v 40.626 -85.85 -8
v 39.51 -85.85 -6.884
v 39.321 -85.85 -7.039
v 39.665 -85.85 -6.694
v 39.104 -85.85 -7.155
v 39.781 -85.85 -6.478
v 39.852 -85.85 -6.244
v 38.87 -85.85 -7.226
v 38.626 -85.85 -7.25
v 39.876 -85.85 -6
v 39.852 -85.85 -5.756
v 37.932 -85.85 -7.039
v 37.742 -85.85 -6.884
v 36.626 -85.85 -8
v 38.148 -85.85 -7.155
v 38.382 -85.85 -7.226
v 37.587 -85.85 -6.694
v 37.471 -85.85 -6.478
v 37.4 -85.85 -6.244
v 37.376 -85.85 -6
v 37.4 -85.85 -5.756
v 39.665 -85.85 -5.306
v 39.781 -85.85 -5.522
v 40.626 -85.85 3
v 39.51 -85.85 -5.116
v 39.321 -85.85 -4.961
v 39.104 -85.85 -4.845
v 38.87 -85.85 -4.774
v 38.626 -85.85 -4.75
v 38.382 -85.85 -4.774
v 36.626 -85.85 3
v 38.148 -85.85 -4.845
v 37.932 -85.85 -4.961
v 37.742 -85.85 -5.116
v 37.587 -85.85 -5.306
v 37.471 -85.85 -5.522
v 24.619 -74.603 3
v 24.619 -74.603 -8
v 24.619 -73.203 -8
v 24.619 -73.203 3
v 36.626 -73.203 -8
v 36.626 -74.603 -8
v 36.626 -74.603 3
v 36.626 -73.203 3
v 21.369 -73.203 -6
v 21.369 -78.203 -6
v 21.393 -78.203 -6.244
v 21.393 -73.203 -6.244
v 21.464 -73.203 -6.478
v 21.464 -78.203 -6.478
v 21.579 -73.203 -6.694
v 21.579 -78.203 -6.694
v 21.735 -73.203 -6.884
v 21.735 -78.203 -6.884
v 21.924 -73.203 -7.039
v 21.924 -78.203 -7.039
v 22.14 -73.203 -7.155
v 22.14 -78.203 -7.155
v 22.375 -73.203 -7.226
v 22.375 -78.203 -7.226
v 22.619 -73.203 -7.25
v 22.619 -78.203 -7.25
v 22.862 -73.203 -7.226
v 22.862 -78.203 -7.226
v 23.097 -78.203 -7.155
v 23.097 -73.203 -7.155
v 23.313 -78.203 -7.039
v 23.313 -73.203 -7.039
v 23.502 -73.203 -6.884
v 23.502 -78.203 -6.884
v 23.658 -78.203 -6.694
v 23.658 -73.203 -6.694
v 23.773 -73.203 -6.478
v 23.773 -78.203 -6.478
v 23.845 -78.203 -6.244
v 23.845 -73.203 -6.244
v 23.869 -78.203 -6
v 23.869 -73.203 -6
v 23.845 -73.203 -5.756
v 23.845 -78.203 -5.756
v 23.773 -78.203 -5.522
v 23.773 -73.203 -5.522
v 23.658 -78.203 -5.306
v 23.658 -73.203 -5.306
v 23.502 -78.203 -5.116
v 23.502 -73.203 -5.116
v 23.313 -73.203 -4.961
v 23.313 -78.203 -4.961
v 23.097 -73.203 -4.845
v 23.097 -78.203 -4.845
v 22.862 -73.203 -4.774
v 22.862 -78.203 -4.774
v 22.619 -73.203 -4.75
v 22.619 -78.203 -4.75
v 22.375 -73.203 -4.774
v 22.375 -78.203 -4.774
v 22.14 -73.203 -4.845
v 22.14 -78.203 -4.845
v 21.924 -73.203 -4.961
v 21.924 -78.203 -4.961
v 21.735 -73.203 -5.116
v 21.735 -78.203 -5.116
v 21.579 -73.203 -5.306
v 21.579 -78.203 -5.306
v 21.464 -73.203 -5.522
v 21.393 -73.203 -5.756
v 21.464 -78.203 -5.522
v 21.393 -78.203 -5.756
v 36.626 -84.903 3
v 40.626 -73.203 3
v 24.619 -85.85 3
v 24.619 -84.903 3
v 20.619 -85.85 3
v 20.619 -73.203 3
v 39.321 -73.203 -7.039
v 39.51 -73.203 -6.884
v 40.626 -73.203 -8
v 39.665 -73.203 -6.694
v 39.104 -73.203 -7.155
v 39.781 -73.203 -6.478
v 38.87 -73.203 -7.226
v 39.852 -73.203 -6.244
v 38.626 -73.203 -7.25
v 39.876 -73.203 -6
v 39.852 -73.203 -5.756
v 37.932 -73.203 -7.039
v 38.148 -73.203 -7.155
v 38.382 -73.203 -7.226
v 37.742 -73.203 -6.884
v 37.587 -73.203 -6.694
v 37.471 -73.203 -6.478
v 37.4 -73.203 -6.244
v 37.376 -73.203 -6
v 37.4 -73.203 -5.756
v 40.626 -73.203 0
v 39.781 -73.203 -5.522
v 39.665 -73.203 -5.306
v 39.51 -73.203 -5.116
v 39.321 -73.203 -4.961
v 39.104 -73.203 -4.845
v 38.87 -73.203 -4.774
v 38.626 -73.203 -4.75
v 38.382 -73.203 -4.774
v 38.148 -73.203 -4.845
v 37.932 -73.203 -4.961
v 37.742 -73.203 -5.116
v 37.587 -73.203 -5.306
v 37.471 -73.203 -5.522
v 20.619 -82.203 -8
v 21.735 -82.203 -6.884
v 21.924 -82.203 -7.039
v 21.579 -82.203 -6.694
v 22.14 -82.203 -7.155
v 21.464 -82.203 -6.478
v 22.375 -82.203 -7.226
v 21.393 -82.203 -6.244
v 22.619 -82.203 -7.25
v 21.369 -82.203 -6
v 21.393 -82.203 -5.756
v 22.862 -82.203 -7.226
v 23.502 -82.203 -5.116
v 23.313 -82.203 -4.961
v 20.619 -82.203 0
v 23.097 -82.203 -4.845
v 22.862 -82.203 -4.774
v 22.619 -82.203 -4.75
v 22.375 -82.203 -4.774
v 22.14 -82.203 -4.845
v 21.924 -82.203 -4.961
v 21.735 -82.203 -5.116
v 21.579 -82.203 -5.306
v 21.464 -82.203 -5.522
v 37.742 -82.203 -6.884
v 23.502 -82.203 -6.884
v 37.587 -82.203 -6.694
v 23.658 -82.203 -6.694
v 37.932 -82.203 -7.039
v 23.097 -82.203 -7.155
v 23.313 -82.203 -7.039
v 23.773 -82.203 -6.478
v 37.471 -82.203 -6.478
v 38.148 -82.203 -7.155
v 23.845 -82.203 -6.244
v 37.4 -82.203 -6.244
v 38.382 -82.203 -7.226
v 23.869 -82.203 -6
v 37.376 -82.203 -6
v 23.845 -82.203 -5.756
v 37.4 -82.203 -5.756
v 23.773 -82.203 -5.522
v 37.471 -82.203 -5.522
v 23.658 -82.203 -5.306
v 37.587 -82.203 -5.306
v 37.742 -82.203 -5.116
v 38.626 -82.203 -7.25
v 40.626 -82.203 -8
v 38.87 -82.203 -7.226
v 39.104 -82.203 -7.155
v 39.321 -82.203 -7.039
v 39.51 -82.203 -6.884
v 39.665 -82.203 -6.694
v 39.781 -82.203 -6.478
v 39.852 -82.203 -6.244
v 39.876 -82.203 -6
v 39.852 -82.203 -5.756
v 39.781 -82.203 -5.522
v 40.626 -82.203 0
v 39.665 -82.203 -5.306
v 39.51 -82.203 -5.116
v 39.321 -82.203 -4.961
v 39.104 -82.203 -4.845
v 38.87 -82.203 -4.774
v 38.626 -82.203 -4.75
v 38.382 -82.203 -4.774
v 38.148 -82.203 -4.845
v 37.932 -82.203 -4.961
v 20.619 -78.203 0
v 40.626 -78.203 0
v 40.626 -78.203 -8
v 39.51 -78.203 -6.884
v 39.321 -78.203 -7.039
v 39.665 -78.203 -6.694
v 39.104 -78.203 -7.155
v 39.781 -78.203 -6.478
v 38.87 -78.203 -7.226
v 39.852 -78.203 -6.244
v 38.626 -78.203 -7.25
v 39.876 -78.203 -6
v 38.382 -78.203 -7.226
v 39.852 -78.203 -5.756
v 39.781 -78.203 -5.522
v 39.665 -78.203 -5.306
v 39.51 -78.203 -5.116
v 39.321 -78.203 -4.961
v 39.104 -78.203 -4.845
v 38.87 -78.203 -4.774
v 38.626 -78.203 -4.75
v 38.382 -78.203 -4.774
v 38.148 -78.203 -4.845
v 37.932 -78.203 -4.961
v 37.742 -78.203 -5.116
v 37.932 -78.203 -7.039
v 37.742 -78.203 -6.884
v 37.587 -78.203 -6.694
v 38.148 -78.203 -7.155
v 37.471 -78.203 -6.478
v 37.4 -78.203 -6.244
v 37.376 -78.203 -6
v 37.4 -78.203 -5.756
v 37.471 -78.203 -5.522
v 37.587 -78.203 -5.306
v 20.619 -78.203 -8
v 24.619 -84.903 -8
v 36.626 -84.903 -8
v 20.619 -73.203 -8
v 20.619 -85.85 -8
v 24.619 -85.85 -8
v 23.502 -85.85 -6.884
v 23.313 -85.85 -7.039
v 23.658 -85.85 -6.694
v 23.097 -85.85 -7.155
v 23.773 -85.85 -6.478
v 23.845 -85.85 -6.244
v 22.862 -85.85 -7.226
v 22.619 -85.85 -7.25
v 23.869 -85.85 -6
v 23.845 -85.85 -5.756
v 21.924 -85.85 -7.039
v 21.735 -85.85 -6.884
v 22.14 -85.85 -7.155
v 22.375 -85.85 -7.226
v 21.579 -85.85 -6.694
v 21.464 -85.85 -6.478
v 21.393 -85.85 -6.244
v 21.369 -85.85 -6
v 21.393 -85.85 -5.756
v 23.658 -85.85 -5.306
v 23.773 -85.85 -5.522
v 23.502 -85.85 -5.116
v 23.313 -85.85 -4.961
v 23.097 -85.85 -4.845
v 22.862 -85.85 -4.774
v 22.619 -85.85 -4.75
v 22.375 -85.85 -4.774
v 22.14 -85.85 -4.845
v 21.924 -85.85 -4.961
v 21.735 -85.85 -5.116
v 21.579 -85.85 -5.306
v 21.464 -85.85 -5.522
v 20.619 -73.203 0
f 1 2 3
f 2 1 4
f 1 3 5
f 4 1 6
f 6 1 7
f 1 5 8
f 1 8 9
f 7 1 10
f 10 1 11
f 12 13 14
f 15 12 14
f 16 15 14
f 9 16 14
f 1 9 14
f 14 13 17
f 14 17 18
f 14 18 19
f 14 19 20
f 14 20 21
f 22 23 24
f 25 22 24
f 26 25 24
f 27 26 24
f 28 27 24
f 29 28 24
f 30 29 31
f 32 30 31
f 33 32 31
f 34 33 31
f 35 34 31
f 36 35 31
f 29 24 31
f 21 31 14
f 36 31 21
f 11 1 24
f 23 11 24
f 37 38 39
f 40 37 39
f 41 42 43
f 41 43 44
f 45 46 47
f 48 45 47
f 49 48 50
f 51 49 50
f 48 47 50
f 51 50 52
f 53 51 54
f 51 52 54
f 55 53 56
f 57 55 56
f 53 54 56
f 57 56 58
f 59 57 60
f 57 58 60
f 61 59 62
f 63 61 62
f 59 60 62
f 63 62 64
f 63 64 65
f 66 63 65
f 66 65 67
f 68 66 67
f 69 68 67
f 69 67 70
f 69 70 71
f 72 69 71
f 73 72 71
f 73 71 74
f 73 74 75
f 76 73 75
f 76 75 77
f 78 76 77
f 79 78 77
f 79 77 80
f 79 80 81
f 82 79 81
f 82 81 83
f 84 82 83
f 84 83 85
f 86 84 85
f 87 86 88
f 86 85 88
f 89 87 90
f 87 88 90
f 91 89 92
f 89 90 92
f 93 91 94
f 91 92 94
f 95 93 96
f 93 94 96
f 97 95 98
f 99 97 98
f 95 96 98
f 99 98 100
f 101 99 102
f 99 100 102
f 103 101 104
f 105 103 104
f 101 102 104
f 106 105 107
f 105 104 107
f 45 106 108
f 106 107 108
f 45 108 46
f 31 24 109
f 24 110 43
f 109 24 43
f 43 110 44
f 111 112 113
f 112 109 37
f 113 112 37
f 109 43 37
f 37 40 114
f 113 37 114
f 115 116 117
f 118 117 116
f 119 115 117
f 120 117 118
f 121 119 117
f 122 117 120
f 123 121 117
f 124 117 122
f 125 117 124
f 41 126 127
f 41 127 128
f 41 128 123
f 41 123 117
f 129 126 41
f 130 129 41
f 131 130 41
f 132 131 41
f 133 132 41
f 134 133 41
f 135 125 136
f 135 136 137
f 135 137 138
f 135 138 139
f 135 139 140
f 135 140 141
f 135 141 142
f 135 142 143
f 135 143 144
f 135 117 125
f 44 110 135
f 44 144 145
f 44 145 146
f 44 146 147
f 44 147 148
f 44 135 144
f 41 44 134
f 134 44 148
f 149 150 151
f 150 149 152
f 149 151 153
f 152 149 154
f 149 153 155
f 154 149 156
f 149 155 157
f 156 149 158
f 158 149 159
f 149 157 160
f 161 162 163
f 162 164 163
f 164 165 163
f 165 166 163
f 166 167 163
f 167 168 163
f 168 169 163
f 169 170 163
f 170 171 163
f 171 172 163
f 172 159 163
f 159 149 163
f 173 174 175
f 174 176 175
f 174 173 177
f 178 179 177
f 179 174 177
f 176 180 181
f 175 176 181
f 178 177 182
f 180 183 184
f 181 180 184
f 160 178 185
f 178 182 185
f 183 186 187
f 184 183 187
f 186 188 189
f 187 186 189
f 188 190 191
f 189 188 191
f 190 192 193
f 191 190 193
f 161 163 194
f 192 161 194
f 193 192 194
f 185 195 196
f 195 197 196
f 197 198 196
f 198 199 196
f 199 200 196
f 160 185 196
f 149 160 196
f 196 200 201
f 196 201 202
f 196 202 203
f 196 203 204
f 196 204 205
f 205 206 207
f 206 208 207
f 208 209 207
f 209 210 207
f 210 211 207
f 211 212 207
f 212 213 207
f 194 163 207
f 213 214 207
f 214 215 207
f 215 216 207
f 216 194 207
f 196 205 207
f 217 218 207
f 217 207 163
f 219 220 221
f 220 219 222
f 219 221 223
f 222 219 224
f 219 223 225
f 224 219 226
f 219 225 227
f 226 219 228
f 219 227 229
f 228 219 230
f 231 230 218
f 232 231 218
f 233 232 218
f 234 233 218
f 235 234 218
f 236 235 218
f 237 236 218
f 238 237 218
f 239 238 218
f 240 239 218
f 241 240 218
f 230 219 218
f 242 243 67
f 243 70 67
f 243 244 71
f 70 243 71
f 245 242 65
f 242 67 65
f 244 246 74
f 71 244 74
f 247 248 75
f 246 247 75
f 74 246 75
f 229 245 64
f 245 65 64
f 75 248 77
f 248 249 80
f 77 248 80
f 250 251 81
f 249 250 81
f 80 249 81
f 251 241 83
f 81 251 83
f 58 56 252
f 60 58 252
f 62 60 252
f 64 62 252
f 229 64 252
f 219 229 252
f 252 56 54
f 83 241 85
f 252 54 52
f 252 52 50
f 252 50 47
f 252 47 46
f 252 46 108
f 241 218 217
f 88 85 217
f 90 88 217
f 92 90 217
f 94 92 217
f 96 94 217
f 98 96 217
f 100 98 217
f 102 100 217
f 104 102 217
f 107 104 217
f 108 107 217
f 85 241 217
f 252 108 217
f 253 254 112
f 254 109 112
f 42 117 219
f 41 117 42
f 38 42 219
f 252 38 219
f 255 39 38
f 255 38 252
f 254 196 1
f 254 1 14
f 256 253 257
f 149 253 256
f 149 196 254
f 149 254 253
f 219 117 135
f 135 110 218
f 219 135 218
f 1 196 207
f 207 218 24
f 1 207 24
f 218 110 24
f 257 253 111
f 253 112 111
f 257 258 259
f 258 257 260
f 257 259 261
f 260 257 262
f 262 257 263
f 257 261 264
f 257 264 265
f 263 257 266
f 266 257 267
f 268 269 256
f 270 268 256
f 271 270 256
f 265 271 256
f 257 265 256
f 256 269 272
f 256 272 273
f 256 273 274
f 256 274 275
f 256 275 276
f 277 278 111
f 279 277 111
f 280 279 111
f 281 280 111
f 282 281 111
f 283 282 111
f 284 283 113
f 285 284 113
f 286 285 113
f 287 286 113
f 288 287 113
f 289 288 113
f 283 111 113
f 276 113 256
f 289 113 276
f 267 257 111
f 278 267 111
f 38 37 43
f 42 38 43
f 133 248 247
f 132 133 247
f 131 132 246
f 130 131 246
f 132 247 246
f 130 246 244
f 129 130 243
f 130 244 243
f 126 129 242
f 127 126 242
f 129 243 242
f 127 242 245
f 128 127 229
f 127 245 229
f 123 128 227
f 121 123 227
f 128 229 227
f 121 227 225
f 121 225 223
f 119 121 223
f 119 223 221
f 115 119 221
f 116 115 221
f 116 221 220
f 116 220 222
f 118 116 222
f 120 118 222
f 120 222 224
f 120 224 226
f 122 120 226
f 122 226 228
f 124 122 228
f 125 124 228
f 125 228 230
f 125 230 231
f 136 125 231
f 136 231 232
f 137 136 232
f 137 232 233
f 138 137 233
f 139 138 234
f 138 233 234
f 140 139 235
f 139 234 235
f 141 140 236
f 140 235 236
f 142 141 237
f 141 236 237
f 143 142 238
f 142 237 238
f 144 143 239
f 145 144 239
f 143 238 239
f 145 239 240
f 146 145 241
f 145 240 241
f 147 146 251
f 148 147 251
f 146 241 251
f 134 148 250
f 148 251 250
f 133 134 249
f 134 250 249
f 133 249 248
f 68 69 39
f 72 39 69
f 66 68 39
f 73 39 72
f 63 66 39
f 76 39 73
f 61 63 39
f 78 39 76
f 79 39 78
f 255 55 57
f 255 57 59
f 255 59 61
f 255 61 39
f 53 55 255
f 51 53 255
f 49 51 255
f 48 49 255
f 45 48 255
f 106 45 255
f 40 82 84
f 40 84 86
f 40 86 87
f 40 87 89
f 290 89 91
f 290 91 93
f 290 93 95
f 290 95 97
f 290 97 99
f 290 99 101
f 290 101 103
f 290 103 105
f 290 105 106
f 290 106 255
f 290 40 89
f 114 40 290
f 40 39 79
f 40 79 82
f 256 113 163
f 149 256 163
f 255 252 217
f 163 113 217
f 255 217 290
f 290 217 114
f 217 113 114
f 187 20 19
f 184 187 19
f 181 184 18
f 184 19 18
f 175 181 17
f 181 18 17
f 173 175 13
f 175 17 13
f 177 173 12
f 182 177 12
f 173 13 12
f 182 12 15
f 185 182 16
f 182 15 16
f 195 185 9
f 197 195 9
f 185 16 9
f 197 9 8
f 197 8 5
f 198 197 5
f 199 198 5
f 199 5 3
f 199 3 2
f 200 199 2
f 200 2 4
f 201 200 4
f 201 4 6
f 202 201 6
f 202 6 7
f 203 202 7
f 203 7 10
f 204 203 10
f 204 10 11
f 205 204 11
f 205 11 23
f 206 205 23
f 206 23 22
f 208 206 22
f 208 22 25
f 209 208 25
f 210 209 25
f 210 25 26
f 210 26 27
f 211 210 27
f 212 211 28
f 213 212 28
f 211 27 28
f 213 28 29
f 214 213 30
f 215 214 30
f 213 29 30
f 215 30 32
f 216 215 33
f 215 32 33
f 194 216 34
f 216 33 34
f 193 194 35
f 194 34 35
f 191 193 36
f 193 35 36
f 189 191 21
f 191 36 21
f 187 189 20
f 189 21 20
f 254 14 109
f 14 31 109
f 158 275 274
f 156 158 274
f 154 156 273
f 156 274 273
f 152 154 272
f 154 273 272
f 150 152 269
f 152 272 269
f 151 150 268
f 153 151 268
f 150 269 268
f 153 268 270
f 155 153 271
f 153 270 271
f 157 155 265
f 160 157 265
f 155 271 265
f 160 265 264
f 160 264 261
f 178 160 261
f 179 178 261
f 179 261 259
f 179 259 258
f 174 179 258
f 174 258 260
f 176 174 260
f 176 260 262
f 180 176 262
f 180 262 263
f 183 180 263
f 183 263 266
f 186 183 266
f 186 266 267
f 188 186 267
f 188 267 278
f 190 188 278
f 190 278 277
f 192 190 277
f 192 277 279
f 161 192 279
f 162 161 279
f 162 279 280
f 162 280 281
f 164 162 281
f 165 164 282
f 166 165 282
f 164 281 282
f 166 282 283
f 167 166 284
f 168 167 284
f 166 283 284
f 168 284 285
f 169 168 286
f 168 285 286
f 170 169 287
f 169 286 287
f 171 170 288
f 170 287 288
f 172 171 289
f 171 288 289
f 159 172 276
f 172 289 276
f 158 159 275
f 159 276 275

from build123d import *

# Parameters (mm, degrees)
BOSS_EXTRUDE1_DEPTH         = 3
SKETCH2_W                   = 20.0076
SKETCH2_H                   = 4.999999987
BOSS_EXTRUDE2_DEPTH         = 8
BOSS_EXTRUDE3_DEPTH         = 8
SKETCH4_W                   = 12.0076
SKETCH4_H                   = 1.4
CUT_EXTRUDE1_DEPTH          = 27.7
TAP_DRILL_FOR_M3_TAP1_D     = 2.5
TAP_DRILL_FOR_M3_TAP1_DEPTH = 15.5
TAP_DRILL_FOR_M3_TAP1_TIP   = 0.751075774


with BuildPart() as part:
    # Sketch1 → Boss-Extrude1 (new body)
    with BuildSketch(Plane.XY):
        Polygon((24.618539046, -84.902707764), (24.618539046, -85.849818272), (20.618539046, -85.849818272), (20.618539046, -73.202707764), (40.626139046, -73.202707764), (40.626139046, -85.849818272), (36.626139046, -85.849818272), (36.626139046, -84.902707764), align=None)
    extrude(amount=BOSS_EXTRUDE1_DEPTH)

    # Sketch2 → Boss-Extrude2 (add)
    with BuildSketch(Plane(origin=(0, 0, 0), x_dir=(-1, 0, 0), z_dir=(0, 0, -1))):
        with Locations((-30.622339046, -75.702707758)):
            Rectangle(SKETCH2_W, SKETCH2_H)
    extrude(amount=BOSS_EXTRUDE2_DEPTH)

    # Sketch3 → Boss-Extrude3 (add)
    with BuildSketch(Plane(origin=(0, 0, 0), x_dir=(-1, 0, 0), z_dir=(0, 0, -1))):
        Polygon((-40.626139046, -82.202707751), (-40.626139046, -85.849818272), (-36.626139046, -85.849818272), (-36.626139046, -84.902707764), (-24.618539046, -84.902707764), (-24.618539046, -85.849818272), (-20.618539046, -85.849818272), (-20.618539046, -82.202707751), align=None)
    extrude(amount=BOSS_EXTRUDE3_DEPTH)

    # Sketch4 → Cut-Extrude1 (cut)
    with BuildSketch(Plane.XY.offset(3)):
        with Locations((30.622339046, -73.902707764)):
            Rectangle(SKETCH4_W, SKETCH4_H)
    extrude(amount=-CUT_EXTRUDE1_DEPTH, mode=Mode.SUBTRACT)

    # Tap Drill for M3 Tap1
    with Locations(Plane(origin=(0, -73.202707764, 0), x_dir=(1, 0, 0), z_dir=(0, 1, 0))):
        with Locations((22.618539046, 6), (38.626139046, 6)):
            Hole(TAP_DRILL_FOR_M3_TAP1_D / 2, depth=TAP_DRILL_FOR_M3_TAP1_DEPTH)
            with Locations((0, 0, -(TAP_DRILL_FOR_M3_TAP1_DEPTH + TAP_DRILL_FOR_M3_TAP1_TIP / 2))):  # 118° drill point
                Cone(0, TAP_DRILL_FOR_M3_TAP1_D / 2, TAP_DRILL_FOR_M3_TAP1_TIP, mode=Mode.SUBTRACT)


solid = part.part
